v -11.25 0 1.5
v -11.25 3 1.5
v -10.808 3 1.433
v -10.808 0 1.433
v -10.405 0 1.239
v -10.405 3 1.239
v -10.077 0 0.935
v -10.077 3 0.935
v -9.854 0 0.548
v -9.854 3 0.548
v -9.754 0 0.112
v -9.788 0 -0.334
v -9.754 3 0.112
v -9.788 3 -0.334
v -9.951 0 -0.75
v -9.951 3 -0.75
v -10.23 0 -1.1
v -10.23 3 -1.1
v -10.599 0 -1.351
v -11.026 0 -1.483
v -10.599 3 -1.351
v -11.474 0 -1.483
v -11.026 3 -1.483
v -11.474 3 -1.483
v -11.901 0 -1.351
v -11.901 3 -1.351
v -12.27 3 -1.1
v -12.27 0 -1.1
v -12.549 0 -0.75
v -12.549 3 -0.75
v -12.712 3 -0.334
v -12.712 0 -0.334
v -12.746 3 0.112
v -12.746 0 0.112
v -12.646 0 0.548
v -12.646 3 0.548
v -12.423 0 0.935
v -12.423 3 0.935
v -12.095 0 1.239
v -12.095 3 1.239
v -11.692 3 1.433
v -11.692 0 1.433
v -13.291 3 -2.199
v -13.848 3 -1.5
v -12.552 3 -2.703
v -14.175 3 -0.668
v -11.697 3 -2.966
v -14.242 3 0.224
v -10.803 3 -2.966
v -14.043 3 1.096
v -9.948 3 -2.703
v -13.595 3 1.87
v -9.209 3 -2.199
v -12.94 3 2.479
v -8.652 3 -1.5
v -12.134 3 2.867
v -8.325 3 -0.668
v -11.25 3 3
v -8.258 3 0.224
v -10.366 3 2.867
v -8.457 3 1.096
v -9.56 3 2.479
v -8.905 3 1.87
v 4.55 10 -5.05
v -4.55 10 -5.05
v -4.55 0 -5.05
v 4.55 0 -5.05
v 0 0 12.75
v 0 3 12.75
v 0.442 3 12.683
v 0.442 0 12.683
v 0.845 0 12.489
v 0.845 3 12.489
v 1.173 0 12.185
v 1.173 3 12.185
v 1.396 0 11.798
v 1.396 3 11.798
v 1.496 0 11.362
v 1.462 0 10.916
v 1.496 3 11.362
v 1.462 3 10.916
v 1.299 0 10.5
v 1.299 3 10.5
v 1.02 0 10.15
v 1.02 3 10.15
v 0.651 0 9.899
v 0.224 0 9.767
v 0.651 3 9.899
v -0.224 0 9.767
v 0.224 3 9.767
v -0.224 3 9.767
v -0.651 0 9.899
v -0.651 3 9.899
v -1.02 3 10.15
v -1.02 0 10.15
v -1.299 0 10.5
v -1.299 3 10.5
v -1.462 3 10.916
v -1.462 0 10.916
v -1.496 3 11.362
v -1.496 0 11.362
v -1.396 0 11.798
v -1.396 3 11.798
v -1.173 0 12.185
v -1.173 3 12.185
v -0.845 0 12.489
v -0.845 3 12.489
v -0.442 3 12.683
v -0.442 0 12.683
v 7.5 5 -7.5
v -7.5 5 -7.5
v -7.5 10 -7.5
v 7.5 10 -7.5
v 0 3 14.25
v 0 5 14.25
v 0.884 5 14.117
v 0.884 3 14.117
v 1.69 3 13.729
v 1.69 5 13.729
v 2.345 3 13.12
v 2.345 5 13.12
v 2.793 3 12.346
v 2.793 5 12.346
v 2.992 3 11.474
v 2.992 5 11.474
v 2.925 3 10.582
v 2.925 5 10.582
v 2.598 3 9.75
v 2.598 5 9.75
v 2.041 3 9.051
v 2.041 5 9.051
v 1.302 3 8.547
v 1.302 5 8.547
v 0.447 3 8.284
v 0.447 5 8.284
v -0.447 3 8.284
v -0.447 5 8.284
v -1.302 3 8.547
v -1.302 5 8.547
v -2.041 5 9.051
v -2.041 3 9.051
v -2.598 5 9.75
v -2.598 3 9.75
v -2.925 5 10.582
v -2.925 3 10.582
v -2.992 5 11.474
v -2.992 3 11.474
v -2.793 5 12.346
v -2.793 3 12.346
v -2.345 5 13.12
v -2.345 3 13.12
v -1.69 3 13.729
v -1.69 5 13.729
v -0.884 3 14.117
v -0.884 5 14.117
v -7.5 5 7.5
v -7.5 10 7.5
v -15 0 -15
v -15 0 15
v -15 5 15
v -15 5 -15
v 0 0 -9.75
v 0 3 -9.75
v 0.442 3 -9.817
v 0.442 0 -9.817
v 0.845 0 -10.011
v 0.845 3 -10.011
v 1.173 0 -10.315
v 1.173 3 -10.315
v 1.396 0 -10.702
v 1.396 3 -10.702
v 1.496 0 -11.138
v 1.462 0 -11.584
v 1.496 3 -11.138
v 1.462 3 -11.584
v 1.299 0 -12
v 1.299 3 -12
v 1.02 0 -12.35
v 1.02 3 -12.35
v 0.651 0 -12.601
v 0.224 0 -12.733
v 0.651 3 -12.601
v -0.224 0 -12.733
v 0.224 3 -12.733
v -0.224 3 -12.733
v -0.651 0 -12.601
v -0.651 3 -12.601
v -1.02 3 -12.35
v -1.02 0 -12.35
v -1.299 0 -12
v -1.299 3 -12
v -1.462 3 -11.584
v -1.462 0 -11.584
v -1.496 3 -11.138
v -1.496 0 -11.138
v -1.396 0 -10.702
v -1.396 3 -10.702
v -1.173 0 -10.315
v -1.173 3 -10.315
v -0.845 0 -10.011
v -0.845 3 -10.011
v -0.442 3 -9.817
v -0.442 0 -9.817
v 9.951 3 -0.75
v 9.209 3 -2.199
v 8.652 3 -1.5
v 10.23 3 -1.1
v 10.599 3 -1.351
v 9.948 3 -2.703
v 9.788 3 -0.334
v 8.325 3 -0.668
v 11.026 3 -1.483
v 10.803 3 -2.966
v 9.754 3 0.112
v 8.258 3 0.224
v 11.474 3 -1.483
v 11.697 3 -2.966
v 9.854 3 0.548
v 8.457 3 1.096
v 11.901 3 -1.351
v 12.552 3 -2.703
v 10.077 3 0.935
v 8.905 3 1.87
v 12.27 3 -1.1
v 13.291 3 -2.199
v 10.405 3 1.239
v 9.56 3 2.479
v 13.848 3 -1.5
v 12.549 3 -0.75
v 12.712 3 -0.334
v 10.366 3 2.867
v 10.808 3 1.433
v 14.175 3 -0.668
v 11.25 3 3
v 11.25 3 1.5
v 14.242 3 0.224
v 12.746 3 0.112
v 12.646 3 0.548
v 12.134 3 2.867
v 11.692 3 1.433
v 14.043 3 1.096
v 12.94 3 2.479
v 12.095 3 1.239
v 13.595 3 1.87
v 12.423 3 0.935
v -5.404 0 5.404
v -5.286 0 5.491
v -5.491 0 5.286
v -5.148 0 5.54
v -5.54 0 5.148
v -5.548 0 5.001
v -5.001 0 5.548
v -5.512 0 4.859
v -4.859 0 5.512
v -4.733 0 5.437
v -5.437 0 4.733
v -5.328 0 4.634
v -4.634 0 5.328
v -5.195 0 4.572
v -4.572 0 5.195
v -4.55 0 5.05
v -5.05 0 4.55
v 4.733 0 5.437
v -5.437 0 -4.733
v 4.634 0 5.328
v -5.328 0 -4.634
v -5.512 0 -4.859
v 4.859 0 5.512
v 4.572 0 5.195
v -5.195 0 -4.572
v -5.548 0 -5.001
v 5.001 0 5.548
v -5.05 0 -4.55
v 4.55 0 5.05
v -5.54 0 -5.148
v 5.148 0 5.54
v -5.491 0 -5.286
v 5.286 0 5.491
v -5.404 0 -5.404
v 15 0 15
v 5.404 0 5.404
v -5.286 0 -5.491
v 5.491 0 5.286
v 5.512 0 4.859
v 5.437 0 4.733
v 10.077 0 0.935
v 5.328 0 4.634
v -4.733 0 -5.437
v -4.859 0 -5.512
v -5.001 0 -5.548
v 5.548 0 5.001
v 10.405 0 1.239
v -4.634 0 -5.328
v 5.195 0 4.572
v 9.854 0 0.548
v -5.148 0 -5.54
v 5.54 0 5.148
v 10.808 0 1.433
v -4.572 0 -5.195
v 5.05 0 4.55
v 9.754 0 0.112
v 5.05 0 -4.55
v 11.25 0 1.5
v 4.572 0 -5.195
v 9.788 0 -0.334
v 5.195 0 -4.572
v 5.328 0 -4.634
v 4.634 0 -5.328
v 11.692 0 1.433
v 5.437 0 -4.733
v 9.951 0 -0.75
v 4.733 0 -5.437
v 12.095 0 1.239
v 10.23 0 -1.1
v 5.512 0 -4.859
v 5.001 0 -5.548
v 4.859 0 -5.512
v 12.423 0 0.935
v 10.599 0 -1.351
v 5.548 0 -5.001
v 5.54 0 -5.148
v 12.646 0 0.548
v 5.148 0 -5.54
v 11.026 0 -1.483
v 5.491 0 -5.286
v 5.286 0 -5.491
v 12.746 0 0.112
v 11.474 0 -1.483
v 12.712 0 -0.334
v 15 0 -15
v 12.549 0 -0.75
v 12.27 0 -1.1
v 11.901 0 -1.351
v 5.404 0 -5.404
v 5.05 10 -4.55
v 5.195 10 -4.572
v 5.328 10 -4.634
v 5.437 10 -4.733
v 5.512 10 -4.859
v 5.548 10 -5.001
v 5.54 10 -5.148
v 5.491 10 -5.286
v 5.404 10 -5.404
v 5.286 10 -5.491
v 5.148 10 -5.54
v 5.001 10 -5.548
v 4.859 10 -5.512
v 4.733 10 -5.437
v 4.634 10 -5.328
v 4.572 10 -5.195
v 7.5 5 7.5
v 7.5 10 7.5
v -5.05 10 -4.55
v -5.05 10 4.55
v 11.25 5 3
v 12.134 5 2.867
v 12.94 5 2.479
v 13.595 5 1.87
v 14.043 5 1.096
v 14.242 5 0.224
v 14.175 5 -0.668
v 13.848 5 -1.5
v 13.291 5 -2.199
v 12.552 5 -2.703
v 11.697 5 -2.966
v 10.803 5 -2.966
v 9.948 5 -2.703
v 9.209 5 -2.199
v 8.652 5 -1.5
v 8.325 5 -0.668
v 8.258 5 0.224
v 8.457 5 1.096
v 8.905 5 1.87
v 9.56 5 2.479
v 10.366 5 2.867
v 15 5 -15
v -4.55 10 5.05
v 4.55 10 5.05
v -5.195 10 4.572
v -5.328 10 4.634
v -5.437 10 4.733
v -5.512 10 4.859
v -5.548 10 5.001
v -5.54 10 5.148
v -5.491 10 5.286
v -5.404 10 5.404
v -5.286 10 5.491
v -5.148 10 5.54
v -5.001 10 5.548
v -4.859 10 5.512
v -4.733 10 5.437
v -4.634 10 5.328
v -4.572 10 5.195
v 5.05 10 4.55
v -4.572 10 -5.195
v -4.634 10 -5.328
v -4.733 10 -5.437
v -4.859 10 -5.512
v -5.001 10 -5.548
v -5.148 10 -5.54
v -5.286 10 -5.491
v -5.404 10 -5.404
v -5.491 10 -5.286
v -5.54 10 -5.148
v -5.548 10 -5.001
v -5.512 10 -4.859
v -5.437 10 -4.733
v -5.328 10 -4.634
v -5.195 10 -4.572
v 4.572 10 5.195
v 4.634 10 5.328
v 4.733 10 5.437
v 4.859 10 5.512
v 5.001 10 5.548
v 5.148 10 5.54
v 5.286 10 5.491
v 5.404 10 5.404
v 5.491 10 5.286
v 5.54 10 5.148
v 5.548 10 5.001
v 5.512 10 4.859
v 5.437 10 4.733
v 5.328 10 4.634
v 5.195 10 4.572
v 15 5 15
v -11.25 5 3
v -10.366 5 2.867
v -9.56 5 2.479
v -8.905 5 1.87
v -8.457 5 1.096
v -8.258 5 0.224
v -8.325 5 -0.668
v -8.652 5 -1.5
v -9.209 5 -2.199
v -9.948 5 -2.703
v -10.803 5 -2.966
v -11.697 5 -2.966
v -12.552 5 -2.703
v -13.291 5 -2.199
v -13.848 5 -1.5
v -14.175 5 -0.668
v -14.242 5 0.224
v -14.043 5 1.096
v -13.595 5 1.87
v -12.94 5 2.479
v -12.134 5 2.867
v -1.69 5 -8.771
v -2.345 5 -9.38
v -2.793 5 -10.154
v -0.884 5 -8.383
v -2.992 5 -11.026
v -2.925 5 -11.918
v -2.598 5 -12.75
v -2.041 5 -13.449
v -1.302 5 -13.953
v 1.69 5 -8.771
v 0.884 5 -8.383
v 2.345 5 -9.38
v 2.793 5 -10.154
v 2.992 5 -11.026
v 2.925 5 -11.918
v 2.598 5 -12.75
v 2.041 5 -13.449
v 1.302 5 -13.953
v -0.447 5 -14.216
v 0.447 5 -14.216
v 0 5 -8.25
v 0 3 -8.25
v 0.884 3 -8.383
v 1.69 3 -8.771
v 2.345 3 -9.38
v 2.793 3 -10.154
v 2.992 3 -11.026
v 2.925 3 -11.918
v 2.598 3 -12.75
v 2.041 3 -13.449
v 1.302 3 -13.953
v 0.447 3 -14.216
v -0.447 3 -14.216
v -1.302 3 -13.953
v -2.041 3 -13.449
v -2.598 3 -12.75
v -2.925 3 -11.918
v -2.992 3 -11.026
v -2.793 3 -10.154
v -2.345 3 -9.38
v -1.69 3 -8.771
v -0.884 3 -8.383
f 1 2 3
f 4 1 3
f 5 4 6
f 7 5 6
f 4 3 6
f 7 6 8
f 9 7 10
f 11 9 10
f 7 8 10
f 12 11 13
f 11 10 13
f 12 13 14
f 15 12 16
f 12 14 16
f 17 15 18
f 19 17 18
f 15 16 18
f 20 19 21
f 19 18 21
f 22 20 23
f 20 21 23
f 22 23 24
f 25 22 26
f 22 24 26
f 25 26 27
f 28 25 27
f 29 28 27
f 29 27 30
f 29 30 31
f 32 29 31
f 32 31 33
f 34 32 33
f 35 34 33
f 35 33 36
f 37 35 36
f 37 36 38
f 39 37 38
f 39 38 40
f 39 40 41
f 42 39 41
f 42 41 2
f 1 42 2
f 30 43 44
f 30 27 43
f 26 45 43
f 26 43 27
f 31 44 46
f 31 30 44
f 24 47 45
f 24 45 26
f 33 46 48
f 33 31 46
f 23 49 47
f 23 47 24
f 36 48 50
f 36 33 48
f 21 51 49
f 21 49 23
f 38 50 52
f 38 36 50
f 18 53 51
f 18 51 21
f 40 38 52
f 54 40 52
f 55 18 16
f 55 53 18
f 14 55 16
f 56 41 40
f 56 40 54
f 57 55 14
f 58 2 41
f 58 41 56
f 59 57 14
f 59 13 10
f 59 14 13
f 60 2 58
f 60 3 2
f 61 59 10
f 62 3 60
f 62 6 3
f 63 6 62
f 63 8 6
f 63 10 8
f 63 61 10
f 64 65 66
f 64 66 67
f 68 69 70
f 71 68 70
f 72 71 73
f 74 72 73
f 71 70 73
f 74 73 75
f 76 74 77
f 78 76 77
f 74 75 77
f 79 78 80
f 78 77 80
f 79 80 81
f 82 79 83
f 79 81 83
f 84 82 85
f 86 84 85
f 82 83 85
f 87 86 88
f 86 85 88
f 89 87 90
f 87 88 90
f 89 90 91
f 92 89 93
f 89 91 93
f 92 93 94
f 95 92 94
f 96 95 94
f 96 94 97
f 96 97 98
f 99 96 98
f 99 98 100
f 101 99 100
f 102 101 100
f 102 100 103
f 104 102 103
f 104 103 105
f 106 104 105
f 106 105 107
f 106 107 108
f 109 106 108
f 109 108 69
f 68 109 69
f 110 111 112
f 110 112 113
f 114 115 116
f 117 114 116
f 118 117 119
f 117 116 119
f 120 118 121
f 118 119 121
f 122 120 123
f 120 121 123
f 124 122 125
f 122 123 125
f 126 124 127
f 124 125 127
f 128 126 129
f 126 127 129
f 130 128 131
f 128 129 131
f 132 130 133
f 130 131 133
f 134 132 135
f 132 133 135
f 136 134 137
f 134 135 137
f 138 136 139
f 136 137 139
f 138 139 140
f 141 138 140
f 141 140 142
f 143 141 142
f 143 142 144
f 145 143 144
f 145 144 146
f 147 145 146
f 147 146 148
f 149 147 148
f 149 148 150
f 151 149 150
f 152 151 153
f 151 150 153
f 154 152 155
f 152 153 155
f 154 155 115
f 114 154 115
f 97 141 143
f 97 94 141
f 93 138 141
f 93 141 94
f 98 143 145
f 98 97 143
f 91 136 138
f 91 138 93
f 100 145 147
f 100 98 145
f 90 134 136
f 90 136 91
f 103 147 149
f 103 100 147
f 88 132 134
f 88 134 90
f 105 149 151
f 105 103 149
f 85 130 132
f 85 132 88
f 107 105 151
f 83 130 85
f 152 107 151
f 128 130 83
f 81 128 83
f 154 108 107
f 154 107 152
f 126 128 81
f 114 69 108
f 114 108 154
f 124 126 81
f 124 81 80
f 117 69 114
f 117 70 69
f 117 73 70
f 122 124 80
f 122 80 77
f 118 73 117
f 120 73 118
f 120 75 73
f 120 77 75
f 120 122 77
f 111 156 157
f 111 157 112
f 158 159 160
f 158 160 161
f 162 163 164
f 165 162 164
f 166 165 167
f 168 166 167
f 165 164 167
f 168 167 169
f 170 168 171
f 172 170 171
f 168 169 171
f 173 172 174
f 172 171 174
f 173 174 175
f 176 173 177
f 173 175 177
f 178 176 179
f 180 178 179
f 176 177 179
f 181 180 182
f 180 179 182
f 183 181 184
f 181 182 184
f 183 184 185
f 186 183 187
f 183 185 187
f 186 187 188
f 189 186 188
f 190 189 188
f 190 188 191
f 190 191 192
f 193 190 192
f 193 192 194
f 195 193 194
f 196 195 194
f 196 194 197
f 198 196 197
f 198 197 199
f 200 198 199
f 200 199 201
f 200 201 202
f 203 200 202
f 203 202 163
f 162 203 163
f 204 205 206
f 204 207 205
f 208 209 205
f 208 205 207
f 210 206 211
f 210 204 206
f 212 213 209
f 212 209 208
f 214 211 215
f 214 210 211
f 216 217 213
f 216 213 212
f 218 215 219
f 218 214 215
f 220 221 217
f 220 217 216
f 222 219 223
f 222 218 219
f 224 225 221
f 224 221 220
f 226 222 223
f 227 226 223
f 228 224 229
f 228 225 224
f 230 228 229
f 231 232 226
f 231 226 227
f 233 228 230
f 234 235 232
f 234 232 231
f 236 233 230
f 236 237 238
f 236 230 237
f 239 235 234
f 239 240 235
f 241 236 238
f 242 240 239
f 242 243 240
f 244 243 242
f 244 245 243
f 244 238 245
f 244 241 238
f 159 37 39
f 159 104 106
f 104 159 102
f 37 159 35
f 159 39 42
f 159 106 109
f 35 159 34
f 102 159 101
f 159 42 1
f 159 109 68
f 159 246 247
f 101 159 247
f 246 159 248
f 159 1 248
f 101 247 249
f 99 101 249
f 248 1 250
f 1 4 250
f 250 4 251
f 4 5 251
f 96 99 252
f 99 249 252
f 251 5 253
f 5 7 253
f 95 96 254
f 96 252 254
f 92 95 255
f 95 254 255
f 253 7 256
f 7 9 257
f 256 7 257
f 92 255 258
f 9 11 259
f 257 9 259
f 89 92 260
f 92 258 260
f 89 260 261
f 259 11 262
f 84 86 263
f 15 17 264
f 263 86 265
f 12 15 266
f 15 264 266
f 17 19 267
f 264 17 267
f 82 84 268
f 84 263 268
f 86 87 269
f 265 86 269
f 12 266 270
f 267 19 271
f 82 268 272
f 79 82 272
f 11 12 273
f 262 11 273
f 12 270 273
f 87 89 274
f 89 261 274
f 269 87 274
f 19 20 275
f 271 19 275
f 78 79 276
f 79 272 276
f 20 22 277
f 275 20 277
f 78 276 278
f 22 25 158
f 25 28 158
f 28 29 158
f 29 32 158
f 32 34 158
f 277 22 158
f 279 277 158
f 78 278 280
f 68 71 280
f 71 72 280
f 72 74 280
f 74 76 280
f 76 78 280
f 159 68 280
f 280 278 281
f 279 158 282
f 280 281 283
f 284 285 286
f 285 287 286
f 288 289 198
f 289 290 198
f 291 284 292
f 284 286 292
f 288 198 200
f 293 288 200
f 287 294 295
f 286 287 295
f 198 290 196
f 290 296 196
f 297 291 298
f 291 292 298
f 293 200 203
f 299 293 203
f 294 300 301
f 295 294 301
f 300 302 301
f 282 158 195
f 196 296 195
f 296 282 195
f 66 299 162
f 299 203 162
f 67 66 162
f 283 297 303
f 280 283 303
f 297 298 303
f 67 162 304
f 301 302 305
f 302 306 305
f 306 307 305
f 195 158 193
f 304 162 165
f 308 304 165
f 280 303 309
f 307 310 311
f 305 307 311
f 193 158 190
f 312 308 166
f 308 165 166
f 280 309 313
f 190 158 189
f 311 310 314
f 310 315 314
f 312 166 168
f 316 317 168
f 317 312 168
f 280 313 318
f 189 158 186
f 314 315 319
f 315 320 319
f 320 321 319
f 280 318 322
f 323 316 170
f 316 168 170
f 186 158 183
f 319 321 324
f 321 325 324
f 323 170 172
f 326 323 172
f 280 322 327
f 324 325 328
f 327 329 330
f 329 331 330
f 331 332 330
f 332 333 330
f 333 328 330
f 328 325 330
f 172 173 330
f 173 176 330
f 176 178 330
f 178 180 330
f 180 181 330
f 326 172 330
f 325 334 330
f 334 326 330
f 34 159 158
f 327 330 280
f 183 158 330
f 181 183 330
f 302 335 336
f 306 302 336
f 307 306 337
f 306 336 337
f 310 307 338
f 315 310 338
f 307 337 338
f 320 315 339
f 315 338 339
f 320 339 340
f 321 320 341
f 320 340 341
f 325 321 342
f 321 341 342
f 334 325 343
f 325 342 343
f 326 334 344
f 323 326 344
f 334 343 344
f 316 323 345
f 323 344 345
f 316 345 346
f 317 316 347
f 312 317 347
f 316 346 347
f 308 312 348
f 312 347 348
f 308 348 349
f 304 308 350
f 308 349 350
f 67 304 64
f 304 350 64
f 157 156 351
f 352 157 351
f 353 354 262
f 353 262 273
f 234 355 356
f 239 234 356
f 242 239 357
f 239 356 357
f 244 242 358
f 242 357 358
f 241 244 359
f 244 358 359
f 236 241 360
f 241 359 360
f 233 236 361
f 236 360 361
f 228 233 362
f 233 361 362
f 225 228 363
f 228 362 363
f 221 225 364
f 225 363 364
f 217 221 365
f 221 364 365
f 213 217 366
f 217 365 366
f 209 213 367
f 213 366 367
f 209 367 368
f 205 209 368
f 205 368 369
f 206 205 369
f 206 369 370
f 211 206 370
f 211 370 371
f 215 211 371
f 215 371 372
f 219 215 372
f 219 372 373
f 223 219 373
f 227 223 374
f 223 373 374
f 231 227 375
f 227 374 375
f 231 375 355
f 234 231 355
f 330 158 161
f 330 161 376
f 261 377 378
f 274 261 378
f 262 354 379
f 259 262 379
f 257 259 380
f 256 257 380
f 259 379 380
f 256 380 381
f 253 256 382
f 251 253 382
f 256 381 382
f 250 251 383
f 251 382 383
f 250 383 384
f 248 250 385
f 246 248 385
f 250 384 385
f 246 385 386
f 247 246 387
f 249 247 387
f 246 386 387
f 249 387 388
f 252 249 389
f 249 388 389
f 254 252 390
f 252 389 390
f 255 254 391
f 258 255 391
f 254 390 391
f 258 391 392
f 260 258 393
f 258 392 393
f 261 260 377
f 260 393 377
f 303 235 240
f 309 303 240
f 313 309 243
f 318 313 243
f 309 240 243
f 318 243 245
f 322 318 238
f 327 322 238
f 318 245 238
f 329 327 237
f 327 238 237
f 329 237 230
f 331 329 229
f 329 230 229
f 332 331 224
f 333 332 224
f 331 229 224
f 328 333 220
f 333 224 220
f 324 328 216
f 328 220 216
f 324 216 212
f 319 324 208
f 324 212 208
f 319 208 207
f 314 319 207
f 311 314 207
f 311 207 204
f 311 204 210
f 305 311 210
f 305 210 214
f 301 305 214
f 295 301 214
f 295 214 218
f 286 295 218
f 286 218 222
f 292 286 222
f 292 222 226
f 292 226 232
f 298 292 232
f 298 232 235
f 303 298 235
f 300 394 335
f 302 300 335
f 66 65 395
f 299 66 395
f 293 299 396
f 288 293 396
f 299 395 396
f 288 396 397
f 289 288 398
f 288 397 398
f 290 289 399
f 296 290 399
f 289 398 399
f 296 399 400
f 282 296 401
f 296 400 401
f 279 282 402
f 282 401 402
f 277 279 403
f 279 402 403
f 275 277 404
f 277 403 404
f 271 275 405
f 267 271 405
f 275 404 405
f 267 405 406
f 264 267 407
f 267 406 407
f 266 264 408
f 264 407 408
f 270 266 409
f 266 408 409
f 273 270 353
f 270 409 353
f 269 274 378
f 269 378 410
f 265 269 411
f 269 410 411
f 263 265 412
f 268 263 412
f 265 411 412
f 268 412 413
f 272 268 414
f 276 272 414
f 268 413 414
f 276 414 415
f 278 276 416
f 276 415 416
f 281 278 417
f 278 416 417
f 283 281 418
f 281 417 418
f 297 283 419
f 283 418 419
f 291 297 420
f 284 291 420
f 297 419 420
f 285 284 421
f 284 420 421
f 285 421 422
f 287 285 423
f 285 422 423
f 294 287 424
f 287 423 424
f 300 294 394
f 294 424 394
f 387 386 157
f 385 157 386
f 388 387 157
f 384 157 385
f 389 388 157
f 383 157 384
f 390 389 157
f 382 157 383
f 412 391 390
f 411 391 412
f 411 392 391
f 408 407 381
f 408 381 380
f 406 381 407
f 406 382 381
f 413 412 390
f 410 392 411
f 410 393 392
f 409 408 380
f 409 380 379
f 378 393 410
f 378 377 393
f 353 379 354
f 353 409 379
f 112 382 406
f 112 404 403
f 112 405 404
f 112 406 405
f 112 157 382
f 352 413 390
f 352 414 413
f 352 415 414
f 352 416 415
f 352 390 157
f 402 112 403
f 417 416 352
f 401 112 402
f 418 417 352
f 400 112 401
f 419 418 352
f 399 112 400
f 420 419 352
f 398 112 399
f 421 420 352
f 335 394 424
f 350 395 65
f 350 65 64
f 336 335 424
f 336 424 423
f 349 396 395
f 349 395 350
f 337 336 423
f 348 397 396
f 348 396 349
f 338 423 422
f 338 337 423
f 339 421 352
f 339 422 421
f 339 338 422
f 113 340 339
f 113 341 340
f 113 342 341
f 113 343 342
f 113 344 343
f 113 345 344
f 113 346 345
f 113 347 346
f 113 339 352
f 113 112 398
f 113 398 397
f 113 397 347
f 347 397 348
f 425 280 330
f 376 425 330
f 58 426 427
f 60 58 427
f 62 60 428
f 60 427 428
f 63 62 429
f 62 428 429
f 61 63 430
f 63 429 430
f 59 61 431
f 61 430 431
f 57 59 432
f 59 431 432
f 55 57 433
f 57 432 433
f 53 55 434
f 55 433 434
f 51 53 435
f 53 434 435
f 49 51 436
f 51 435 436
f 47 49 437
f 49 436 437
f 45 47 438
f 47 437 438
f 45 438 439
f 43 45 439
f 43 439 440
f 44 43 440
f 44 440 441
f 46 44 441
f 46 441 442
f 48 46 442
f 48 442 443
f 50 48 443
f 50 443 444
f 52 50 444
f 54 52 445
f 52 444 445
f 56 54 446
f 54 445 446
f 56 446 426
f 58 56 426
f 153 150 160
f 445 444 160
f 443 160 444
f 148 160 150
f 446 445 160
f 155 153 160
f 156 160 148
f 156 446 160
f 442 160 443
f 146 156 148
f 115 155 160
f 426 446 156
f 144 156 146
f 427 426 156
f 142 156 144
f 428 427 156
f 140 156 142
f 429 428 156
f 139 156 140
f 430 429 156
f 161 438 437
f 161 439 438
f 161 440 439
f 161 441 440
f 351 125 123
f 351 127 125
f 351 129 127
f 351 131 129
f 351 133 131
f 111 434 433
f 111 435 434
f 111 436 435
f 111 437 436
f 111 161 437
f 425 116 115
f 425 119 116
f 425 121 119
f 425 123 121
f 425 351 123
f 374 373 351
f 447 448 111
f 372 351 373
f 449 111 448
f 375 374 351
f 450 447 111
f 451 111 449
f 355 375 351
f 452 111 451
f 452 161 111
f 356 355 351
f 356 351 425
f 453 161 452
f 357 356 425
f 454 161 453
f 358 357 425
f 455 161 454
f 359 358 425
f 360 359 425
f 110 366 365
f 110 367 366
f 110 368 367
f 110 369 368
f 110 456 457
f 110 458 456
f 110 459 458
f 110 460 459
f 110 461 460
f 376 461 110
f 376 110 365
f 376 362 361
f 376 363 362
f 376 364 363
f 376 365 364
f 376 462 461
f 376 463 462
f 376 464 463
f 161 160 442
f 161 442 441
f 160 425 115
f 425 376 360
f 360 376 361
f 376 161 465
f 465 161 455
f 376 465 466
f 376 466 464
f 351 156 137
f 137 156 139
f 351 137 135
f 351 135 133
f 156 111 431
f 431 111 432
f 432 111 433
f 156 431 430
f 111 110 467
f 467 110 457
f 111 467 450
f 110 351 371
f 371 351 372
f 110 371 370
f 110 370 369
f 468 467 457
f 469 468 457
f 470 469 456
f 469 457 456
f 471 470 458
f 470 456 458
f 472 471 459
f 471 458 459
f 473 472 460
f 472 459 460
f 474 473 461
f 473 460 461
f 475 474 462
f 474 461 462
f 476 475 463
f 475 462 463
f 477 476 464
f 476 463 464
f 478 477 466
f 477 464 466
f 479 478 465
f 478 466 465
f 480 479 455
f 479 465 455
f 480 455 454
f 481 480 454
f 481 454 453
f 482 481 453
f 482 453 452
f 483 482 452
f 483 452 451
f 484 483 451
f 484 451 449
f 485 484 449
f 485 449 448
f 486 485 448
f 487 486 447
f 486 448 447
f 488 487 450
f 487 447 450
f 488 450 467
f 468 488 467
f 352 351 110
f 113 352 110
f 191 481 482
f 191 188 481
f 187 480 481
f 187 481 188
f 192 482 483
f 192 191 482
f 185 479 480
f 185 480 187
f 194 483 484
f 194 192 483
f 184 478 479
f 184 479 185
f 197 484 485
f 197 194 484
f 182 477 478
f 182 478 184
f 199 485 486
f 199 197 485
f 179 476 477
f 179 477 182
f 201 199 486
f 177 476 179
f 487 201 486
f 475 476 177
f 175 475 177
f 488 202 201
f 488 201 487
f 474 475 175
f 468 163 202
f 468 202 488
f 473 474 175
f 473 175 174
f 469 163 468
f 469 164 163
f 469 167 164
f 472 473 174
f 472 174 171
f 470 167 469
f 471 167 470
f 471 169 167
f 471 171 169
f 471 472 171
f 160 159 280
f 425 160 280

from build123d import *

# Parameters (mm, degrees)
SKETCH_1_W          = 30
SKETCH_1_H          = 30
EXTRUDE_1_DEPTH     = 5
SKETCH_2_W          = 15
SKETCH_2_H          = 15
EXTRUDE_2_DEPTH     = 5
SKETCH_3_R          = 0.5
SKETCH_3_W          = 10.1
SKETCH_3_H          = 10.1
SKETCH_3_R_2        = 1.5
CUT_EXTRUDE_1_DEPTH = 10
SKETCH_4_R          = 3
CUT_EXTRUDE_2_DEPTH = 2


with BuildPart() as part:
    # 草图1 → 凸台-拉伸1 (new body)
    with BuildSketch(Plane(origin=(0, 0, 0), x_dir=(1, 0, 0), z_dir=(0, 1, 0))):
        Rectangle(SKETCH_1_W, SKETCH_1_H)
    extrude(amount=EXTRUDE_1_DEPTH)

    # 草图2 → 凸台-拉伸2 (add)
    with BuildSketch(Plane(origin=(0, 5, 0), x_dir=(1, 0, 0), z_dir=(0, 1, 0))):
        Rectangle(SKETCH_2_W, SKETCH_2_H)
    extrude(amount=EXTRUDE_2_DEPTH)

    # 草图3 → 切除-拉伸1 (cut)
    with BuildSketch(Plane(origin=(0, 10, 0), x_dir=(1, 0, 0), z_dir=(0, 1, 0))):
        with Locations((5.05, -5.05)):
            Circle(SKETCH_3_R)
        with Locations((5.05, 5.05)):
            Circle(SKETCH_3_R)
        with Locations((-5.05, 5.05)):
            Circle(SKETCH_3_R)
        with Locations((-5.05, -5.05)):
            Circle(SKETCH_3_R)
        Rectangle(SKETCH_3_W, SKETCH_3_H)
        with BuildLine():
            ThreePointArc((5.55, 5.05), (5.05, 5.55), (4.55, 5.05))
            Line((4.55, 5.05), (5.05, 5.05))
            Line((5.05, 5.05), (5.05, 4.55))
            ThreePointArc((5.05, 4.55), (5.403553391, 4.696446609), (5.55, 5.05))
        make_face()
        with BuildLine():
            Line((5.05, 5.05), (4.55, 5.05))
            ThreePointArc((4.55, 5.05), (4.696446609, 4.696446609), (5.05, 4.55))
            Line((5.05, 4.55), (5.05, 5.05))
        make_face()
        with BuildLine():
            ThreePointArc((-4.55, -5.05), (-4.696446609, -4.696446609), (-5.05, -4.55))
            Line((-5.05, -4.55), (-5.05, -5.05))
            Line((-5.05, -5.05), (-4.55, -5.05))
        make_face()
        with BuildLine():
            Line((-5.05, -5.05), (-5.05, -4.55))
            ThreePointArc((-5.05, -4.55), (-5.403553391, -5.403553391), (-4.55, -5.05))
            Line((-4.55, -5.05), (-5.05, -5.05))
        make_face()
        with BuildLine():
            Line((-5.05, 4.55), (-5.05, 5.05))
            Line((-5.05, 5.05), (-4.55, 5.05))
            ThreePointArc((-4.55, 5.05), (-5.403553391, 5.403553391), (-5.05, 4.55))
        make_face()
        with BuildLine():
            Line((-4.55, 5.05), (-5.05, 5.05))
            Line((-5.05, 5.05), (-5.05, 4.55))
            ThreePointArc((-5.05, 4.55), (-4.696446609, 4.696446609), (-4.55, 5.05))
        make_face()
        with BuildLine():
            ThreePointArc((5.55, -5.05), (5.403553391, -4.696446609), (5.05, -4.55))
            Line((5.05, -4.55), (5.05, -5.05))
            Line((5.05, -5.05), (4.55, -5.05))
            ThreePointArc((4.55, -5.05), (5.05, -5.55), (5.55, -5.05))
        make_face()
        with BuildLine():
            Line((5.05, -5.05), (5.05, -4.55))
            ThreePointArc((5.05, -4.55), (4.696446609, -4.696446609), (4.55, -5.05))
            Line((4.55, -5.05), (5.05, -5.05))
        make_face()
        with Locations(Location((-11.25, 0, 0), (0, 0, 270))):
            Circle(SKETCH_3_R_2)
        with Locations(Location((0, 11.25, 0), (0, 0, 270))):
            Circle(SKETCH_3_R_2)
        with Locations(Location((11.25, 0, 0), (0, 0, 270))):
            Circle(SKETCH_3_R_2)
        with Locations(Location((0, -11.25, 0), (0, 0, 270))):
            Circle(SKETCH_3_R_2)
    extrude(amount=-CUT_EXTRUDE_1_DEPTH, mode=Mode.SUBTRACT)

    # 草图4 → 切除-拉伸2 (cut)
    with BuildSketch(Plane(origin=(0, 5, 0), x_dir=(1, 0, 0), z_dir=(0, 1, 0))):
        with Locations(Location((11.25, 0, 0), (0, 0, 270))):
            Circle(SKETCH_4_R)
        with Locations(Location((0, -11.25, 0), (0, 0, 270))):
            Circle(SKETCH_4_R)
        with Locations(Location((-11.25, 0, 0), (0, 0, 270))):
            Circle(SKETCH_4_R)
        with Locations(Location((0, 11.25, 0), (0, 0, 270))):
            Circle(SKETCH_4_R)
    extrude(amount=-CUT_EXTRUDE_2_DEPTH, mode=Mode.SUBTRACT)


solid = part.part
